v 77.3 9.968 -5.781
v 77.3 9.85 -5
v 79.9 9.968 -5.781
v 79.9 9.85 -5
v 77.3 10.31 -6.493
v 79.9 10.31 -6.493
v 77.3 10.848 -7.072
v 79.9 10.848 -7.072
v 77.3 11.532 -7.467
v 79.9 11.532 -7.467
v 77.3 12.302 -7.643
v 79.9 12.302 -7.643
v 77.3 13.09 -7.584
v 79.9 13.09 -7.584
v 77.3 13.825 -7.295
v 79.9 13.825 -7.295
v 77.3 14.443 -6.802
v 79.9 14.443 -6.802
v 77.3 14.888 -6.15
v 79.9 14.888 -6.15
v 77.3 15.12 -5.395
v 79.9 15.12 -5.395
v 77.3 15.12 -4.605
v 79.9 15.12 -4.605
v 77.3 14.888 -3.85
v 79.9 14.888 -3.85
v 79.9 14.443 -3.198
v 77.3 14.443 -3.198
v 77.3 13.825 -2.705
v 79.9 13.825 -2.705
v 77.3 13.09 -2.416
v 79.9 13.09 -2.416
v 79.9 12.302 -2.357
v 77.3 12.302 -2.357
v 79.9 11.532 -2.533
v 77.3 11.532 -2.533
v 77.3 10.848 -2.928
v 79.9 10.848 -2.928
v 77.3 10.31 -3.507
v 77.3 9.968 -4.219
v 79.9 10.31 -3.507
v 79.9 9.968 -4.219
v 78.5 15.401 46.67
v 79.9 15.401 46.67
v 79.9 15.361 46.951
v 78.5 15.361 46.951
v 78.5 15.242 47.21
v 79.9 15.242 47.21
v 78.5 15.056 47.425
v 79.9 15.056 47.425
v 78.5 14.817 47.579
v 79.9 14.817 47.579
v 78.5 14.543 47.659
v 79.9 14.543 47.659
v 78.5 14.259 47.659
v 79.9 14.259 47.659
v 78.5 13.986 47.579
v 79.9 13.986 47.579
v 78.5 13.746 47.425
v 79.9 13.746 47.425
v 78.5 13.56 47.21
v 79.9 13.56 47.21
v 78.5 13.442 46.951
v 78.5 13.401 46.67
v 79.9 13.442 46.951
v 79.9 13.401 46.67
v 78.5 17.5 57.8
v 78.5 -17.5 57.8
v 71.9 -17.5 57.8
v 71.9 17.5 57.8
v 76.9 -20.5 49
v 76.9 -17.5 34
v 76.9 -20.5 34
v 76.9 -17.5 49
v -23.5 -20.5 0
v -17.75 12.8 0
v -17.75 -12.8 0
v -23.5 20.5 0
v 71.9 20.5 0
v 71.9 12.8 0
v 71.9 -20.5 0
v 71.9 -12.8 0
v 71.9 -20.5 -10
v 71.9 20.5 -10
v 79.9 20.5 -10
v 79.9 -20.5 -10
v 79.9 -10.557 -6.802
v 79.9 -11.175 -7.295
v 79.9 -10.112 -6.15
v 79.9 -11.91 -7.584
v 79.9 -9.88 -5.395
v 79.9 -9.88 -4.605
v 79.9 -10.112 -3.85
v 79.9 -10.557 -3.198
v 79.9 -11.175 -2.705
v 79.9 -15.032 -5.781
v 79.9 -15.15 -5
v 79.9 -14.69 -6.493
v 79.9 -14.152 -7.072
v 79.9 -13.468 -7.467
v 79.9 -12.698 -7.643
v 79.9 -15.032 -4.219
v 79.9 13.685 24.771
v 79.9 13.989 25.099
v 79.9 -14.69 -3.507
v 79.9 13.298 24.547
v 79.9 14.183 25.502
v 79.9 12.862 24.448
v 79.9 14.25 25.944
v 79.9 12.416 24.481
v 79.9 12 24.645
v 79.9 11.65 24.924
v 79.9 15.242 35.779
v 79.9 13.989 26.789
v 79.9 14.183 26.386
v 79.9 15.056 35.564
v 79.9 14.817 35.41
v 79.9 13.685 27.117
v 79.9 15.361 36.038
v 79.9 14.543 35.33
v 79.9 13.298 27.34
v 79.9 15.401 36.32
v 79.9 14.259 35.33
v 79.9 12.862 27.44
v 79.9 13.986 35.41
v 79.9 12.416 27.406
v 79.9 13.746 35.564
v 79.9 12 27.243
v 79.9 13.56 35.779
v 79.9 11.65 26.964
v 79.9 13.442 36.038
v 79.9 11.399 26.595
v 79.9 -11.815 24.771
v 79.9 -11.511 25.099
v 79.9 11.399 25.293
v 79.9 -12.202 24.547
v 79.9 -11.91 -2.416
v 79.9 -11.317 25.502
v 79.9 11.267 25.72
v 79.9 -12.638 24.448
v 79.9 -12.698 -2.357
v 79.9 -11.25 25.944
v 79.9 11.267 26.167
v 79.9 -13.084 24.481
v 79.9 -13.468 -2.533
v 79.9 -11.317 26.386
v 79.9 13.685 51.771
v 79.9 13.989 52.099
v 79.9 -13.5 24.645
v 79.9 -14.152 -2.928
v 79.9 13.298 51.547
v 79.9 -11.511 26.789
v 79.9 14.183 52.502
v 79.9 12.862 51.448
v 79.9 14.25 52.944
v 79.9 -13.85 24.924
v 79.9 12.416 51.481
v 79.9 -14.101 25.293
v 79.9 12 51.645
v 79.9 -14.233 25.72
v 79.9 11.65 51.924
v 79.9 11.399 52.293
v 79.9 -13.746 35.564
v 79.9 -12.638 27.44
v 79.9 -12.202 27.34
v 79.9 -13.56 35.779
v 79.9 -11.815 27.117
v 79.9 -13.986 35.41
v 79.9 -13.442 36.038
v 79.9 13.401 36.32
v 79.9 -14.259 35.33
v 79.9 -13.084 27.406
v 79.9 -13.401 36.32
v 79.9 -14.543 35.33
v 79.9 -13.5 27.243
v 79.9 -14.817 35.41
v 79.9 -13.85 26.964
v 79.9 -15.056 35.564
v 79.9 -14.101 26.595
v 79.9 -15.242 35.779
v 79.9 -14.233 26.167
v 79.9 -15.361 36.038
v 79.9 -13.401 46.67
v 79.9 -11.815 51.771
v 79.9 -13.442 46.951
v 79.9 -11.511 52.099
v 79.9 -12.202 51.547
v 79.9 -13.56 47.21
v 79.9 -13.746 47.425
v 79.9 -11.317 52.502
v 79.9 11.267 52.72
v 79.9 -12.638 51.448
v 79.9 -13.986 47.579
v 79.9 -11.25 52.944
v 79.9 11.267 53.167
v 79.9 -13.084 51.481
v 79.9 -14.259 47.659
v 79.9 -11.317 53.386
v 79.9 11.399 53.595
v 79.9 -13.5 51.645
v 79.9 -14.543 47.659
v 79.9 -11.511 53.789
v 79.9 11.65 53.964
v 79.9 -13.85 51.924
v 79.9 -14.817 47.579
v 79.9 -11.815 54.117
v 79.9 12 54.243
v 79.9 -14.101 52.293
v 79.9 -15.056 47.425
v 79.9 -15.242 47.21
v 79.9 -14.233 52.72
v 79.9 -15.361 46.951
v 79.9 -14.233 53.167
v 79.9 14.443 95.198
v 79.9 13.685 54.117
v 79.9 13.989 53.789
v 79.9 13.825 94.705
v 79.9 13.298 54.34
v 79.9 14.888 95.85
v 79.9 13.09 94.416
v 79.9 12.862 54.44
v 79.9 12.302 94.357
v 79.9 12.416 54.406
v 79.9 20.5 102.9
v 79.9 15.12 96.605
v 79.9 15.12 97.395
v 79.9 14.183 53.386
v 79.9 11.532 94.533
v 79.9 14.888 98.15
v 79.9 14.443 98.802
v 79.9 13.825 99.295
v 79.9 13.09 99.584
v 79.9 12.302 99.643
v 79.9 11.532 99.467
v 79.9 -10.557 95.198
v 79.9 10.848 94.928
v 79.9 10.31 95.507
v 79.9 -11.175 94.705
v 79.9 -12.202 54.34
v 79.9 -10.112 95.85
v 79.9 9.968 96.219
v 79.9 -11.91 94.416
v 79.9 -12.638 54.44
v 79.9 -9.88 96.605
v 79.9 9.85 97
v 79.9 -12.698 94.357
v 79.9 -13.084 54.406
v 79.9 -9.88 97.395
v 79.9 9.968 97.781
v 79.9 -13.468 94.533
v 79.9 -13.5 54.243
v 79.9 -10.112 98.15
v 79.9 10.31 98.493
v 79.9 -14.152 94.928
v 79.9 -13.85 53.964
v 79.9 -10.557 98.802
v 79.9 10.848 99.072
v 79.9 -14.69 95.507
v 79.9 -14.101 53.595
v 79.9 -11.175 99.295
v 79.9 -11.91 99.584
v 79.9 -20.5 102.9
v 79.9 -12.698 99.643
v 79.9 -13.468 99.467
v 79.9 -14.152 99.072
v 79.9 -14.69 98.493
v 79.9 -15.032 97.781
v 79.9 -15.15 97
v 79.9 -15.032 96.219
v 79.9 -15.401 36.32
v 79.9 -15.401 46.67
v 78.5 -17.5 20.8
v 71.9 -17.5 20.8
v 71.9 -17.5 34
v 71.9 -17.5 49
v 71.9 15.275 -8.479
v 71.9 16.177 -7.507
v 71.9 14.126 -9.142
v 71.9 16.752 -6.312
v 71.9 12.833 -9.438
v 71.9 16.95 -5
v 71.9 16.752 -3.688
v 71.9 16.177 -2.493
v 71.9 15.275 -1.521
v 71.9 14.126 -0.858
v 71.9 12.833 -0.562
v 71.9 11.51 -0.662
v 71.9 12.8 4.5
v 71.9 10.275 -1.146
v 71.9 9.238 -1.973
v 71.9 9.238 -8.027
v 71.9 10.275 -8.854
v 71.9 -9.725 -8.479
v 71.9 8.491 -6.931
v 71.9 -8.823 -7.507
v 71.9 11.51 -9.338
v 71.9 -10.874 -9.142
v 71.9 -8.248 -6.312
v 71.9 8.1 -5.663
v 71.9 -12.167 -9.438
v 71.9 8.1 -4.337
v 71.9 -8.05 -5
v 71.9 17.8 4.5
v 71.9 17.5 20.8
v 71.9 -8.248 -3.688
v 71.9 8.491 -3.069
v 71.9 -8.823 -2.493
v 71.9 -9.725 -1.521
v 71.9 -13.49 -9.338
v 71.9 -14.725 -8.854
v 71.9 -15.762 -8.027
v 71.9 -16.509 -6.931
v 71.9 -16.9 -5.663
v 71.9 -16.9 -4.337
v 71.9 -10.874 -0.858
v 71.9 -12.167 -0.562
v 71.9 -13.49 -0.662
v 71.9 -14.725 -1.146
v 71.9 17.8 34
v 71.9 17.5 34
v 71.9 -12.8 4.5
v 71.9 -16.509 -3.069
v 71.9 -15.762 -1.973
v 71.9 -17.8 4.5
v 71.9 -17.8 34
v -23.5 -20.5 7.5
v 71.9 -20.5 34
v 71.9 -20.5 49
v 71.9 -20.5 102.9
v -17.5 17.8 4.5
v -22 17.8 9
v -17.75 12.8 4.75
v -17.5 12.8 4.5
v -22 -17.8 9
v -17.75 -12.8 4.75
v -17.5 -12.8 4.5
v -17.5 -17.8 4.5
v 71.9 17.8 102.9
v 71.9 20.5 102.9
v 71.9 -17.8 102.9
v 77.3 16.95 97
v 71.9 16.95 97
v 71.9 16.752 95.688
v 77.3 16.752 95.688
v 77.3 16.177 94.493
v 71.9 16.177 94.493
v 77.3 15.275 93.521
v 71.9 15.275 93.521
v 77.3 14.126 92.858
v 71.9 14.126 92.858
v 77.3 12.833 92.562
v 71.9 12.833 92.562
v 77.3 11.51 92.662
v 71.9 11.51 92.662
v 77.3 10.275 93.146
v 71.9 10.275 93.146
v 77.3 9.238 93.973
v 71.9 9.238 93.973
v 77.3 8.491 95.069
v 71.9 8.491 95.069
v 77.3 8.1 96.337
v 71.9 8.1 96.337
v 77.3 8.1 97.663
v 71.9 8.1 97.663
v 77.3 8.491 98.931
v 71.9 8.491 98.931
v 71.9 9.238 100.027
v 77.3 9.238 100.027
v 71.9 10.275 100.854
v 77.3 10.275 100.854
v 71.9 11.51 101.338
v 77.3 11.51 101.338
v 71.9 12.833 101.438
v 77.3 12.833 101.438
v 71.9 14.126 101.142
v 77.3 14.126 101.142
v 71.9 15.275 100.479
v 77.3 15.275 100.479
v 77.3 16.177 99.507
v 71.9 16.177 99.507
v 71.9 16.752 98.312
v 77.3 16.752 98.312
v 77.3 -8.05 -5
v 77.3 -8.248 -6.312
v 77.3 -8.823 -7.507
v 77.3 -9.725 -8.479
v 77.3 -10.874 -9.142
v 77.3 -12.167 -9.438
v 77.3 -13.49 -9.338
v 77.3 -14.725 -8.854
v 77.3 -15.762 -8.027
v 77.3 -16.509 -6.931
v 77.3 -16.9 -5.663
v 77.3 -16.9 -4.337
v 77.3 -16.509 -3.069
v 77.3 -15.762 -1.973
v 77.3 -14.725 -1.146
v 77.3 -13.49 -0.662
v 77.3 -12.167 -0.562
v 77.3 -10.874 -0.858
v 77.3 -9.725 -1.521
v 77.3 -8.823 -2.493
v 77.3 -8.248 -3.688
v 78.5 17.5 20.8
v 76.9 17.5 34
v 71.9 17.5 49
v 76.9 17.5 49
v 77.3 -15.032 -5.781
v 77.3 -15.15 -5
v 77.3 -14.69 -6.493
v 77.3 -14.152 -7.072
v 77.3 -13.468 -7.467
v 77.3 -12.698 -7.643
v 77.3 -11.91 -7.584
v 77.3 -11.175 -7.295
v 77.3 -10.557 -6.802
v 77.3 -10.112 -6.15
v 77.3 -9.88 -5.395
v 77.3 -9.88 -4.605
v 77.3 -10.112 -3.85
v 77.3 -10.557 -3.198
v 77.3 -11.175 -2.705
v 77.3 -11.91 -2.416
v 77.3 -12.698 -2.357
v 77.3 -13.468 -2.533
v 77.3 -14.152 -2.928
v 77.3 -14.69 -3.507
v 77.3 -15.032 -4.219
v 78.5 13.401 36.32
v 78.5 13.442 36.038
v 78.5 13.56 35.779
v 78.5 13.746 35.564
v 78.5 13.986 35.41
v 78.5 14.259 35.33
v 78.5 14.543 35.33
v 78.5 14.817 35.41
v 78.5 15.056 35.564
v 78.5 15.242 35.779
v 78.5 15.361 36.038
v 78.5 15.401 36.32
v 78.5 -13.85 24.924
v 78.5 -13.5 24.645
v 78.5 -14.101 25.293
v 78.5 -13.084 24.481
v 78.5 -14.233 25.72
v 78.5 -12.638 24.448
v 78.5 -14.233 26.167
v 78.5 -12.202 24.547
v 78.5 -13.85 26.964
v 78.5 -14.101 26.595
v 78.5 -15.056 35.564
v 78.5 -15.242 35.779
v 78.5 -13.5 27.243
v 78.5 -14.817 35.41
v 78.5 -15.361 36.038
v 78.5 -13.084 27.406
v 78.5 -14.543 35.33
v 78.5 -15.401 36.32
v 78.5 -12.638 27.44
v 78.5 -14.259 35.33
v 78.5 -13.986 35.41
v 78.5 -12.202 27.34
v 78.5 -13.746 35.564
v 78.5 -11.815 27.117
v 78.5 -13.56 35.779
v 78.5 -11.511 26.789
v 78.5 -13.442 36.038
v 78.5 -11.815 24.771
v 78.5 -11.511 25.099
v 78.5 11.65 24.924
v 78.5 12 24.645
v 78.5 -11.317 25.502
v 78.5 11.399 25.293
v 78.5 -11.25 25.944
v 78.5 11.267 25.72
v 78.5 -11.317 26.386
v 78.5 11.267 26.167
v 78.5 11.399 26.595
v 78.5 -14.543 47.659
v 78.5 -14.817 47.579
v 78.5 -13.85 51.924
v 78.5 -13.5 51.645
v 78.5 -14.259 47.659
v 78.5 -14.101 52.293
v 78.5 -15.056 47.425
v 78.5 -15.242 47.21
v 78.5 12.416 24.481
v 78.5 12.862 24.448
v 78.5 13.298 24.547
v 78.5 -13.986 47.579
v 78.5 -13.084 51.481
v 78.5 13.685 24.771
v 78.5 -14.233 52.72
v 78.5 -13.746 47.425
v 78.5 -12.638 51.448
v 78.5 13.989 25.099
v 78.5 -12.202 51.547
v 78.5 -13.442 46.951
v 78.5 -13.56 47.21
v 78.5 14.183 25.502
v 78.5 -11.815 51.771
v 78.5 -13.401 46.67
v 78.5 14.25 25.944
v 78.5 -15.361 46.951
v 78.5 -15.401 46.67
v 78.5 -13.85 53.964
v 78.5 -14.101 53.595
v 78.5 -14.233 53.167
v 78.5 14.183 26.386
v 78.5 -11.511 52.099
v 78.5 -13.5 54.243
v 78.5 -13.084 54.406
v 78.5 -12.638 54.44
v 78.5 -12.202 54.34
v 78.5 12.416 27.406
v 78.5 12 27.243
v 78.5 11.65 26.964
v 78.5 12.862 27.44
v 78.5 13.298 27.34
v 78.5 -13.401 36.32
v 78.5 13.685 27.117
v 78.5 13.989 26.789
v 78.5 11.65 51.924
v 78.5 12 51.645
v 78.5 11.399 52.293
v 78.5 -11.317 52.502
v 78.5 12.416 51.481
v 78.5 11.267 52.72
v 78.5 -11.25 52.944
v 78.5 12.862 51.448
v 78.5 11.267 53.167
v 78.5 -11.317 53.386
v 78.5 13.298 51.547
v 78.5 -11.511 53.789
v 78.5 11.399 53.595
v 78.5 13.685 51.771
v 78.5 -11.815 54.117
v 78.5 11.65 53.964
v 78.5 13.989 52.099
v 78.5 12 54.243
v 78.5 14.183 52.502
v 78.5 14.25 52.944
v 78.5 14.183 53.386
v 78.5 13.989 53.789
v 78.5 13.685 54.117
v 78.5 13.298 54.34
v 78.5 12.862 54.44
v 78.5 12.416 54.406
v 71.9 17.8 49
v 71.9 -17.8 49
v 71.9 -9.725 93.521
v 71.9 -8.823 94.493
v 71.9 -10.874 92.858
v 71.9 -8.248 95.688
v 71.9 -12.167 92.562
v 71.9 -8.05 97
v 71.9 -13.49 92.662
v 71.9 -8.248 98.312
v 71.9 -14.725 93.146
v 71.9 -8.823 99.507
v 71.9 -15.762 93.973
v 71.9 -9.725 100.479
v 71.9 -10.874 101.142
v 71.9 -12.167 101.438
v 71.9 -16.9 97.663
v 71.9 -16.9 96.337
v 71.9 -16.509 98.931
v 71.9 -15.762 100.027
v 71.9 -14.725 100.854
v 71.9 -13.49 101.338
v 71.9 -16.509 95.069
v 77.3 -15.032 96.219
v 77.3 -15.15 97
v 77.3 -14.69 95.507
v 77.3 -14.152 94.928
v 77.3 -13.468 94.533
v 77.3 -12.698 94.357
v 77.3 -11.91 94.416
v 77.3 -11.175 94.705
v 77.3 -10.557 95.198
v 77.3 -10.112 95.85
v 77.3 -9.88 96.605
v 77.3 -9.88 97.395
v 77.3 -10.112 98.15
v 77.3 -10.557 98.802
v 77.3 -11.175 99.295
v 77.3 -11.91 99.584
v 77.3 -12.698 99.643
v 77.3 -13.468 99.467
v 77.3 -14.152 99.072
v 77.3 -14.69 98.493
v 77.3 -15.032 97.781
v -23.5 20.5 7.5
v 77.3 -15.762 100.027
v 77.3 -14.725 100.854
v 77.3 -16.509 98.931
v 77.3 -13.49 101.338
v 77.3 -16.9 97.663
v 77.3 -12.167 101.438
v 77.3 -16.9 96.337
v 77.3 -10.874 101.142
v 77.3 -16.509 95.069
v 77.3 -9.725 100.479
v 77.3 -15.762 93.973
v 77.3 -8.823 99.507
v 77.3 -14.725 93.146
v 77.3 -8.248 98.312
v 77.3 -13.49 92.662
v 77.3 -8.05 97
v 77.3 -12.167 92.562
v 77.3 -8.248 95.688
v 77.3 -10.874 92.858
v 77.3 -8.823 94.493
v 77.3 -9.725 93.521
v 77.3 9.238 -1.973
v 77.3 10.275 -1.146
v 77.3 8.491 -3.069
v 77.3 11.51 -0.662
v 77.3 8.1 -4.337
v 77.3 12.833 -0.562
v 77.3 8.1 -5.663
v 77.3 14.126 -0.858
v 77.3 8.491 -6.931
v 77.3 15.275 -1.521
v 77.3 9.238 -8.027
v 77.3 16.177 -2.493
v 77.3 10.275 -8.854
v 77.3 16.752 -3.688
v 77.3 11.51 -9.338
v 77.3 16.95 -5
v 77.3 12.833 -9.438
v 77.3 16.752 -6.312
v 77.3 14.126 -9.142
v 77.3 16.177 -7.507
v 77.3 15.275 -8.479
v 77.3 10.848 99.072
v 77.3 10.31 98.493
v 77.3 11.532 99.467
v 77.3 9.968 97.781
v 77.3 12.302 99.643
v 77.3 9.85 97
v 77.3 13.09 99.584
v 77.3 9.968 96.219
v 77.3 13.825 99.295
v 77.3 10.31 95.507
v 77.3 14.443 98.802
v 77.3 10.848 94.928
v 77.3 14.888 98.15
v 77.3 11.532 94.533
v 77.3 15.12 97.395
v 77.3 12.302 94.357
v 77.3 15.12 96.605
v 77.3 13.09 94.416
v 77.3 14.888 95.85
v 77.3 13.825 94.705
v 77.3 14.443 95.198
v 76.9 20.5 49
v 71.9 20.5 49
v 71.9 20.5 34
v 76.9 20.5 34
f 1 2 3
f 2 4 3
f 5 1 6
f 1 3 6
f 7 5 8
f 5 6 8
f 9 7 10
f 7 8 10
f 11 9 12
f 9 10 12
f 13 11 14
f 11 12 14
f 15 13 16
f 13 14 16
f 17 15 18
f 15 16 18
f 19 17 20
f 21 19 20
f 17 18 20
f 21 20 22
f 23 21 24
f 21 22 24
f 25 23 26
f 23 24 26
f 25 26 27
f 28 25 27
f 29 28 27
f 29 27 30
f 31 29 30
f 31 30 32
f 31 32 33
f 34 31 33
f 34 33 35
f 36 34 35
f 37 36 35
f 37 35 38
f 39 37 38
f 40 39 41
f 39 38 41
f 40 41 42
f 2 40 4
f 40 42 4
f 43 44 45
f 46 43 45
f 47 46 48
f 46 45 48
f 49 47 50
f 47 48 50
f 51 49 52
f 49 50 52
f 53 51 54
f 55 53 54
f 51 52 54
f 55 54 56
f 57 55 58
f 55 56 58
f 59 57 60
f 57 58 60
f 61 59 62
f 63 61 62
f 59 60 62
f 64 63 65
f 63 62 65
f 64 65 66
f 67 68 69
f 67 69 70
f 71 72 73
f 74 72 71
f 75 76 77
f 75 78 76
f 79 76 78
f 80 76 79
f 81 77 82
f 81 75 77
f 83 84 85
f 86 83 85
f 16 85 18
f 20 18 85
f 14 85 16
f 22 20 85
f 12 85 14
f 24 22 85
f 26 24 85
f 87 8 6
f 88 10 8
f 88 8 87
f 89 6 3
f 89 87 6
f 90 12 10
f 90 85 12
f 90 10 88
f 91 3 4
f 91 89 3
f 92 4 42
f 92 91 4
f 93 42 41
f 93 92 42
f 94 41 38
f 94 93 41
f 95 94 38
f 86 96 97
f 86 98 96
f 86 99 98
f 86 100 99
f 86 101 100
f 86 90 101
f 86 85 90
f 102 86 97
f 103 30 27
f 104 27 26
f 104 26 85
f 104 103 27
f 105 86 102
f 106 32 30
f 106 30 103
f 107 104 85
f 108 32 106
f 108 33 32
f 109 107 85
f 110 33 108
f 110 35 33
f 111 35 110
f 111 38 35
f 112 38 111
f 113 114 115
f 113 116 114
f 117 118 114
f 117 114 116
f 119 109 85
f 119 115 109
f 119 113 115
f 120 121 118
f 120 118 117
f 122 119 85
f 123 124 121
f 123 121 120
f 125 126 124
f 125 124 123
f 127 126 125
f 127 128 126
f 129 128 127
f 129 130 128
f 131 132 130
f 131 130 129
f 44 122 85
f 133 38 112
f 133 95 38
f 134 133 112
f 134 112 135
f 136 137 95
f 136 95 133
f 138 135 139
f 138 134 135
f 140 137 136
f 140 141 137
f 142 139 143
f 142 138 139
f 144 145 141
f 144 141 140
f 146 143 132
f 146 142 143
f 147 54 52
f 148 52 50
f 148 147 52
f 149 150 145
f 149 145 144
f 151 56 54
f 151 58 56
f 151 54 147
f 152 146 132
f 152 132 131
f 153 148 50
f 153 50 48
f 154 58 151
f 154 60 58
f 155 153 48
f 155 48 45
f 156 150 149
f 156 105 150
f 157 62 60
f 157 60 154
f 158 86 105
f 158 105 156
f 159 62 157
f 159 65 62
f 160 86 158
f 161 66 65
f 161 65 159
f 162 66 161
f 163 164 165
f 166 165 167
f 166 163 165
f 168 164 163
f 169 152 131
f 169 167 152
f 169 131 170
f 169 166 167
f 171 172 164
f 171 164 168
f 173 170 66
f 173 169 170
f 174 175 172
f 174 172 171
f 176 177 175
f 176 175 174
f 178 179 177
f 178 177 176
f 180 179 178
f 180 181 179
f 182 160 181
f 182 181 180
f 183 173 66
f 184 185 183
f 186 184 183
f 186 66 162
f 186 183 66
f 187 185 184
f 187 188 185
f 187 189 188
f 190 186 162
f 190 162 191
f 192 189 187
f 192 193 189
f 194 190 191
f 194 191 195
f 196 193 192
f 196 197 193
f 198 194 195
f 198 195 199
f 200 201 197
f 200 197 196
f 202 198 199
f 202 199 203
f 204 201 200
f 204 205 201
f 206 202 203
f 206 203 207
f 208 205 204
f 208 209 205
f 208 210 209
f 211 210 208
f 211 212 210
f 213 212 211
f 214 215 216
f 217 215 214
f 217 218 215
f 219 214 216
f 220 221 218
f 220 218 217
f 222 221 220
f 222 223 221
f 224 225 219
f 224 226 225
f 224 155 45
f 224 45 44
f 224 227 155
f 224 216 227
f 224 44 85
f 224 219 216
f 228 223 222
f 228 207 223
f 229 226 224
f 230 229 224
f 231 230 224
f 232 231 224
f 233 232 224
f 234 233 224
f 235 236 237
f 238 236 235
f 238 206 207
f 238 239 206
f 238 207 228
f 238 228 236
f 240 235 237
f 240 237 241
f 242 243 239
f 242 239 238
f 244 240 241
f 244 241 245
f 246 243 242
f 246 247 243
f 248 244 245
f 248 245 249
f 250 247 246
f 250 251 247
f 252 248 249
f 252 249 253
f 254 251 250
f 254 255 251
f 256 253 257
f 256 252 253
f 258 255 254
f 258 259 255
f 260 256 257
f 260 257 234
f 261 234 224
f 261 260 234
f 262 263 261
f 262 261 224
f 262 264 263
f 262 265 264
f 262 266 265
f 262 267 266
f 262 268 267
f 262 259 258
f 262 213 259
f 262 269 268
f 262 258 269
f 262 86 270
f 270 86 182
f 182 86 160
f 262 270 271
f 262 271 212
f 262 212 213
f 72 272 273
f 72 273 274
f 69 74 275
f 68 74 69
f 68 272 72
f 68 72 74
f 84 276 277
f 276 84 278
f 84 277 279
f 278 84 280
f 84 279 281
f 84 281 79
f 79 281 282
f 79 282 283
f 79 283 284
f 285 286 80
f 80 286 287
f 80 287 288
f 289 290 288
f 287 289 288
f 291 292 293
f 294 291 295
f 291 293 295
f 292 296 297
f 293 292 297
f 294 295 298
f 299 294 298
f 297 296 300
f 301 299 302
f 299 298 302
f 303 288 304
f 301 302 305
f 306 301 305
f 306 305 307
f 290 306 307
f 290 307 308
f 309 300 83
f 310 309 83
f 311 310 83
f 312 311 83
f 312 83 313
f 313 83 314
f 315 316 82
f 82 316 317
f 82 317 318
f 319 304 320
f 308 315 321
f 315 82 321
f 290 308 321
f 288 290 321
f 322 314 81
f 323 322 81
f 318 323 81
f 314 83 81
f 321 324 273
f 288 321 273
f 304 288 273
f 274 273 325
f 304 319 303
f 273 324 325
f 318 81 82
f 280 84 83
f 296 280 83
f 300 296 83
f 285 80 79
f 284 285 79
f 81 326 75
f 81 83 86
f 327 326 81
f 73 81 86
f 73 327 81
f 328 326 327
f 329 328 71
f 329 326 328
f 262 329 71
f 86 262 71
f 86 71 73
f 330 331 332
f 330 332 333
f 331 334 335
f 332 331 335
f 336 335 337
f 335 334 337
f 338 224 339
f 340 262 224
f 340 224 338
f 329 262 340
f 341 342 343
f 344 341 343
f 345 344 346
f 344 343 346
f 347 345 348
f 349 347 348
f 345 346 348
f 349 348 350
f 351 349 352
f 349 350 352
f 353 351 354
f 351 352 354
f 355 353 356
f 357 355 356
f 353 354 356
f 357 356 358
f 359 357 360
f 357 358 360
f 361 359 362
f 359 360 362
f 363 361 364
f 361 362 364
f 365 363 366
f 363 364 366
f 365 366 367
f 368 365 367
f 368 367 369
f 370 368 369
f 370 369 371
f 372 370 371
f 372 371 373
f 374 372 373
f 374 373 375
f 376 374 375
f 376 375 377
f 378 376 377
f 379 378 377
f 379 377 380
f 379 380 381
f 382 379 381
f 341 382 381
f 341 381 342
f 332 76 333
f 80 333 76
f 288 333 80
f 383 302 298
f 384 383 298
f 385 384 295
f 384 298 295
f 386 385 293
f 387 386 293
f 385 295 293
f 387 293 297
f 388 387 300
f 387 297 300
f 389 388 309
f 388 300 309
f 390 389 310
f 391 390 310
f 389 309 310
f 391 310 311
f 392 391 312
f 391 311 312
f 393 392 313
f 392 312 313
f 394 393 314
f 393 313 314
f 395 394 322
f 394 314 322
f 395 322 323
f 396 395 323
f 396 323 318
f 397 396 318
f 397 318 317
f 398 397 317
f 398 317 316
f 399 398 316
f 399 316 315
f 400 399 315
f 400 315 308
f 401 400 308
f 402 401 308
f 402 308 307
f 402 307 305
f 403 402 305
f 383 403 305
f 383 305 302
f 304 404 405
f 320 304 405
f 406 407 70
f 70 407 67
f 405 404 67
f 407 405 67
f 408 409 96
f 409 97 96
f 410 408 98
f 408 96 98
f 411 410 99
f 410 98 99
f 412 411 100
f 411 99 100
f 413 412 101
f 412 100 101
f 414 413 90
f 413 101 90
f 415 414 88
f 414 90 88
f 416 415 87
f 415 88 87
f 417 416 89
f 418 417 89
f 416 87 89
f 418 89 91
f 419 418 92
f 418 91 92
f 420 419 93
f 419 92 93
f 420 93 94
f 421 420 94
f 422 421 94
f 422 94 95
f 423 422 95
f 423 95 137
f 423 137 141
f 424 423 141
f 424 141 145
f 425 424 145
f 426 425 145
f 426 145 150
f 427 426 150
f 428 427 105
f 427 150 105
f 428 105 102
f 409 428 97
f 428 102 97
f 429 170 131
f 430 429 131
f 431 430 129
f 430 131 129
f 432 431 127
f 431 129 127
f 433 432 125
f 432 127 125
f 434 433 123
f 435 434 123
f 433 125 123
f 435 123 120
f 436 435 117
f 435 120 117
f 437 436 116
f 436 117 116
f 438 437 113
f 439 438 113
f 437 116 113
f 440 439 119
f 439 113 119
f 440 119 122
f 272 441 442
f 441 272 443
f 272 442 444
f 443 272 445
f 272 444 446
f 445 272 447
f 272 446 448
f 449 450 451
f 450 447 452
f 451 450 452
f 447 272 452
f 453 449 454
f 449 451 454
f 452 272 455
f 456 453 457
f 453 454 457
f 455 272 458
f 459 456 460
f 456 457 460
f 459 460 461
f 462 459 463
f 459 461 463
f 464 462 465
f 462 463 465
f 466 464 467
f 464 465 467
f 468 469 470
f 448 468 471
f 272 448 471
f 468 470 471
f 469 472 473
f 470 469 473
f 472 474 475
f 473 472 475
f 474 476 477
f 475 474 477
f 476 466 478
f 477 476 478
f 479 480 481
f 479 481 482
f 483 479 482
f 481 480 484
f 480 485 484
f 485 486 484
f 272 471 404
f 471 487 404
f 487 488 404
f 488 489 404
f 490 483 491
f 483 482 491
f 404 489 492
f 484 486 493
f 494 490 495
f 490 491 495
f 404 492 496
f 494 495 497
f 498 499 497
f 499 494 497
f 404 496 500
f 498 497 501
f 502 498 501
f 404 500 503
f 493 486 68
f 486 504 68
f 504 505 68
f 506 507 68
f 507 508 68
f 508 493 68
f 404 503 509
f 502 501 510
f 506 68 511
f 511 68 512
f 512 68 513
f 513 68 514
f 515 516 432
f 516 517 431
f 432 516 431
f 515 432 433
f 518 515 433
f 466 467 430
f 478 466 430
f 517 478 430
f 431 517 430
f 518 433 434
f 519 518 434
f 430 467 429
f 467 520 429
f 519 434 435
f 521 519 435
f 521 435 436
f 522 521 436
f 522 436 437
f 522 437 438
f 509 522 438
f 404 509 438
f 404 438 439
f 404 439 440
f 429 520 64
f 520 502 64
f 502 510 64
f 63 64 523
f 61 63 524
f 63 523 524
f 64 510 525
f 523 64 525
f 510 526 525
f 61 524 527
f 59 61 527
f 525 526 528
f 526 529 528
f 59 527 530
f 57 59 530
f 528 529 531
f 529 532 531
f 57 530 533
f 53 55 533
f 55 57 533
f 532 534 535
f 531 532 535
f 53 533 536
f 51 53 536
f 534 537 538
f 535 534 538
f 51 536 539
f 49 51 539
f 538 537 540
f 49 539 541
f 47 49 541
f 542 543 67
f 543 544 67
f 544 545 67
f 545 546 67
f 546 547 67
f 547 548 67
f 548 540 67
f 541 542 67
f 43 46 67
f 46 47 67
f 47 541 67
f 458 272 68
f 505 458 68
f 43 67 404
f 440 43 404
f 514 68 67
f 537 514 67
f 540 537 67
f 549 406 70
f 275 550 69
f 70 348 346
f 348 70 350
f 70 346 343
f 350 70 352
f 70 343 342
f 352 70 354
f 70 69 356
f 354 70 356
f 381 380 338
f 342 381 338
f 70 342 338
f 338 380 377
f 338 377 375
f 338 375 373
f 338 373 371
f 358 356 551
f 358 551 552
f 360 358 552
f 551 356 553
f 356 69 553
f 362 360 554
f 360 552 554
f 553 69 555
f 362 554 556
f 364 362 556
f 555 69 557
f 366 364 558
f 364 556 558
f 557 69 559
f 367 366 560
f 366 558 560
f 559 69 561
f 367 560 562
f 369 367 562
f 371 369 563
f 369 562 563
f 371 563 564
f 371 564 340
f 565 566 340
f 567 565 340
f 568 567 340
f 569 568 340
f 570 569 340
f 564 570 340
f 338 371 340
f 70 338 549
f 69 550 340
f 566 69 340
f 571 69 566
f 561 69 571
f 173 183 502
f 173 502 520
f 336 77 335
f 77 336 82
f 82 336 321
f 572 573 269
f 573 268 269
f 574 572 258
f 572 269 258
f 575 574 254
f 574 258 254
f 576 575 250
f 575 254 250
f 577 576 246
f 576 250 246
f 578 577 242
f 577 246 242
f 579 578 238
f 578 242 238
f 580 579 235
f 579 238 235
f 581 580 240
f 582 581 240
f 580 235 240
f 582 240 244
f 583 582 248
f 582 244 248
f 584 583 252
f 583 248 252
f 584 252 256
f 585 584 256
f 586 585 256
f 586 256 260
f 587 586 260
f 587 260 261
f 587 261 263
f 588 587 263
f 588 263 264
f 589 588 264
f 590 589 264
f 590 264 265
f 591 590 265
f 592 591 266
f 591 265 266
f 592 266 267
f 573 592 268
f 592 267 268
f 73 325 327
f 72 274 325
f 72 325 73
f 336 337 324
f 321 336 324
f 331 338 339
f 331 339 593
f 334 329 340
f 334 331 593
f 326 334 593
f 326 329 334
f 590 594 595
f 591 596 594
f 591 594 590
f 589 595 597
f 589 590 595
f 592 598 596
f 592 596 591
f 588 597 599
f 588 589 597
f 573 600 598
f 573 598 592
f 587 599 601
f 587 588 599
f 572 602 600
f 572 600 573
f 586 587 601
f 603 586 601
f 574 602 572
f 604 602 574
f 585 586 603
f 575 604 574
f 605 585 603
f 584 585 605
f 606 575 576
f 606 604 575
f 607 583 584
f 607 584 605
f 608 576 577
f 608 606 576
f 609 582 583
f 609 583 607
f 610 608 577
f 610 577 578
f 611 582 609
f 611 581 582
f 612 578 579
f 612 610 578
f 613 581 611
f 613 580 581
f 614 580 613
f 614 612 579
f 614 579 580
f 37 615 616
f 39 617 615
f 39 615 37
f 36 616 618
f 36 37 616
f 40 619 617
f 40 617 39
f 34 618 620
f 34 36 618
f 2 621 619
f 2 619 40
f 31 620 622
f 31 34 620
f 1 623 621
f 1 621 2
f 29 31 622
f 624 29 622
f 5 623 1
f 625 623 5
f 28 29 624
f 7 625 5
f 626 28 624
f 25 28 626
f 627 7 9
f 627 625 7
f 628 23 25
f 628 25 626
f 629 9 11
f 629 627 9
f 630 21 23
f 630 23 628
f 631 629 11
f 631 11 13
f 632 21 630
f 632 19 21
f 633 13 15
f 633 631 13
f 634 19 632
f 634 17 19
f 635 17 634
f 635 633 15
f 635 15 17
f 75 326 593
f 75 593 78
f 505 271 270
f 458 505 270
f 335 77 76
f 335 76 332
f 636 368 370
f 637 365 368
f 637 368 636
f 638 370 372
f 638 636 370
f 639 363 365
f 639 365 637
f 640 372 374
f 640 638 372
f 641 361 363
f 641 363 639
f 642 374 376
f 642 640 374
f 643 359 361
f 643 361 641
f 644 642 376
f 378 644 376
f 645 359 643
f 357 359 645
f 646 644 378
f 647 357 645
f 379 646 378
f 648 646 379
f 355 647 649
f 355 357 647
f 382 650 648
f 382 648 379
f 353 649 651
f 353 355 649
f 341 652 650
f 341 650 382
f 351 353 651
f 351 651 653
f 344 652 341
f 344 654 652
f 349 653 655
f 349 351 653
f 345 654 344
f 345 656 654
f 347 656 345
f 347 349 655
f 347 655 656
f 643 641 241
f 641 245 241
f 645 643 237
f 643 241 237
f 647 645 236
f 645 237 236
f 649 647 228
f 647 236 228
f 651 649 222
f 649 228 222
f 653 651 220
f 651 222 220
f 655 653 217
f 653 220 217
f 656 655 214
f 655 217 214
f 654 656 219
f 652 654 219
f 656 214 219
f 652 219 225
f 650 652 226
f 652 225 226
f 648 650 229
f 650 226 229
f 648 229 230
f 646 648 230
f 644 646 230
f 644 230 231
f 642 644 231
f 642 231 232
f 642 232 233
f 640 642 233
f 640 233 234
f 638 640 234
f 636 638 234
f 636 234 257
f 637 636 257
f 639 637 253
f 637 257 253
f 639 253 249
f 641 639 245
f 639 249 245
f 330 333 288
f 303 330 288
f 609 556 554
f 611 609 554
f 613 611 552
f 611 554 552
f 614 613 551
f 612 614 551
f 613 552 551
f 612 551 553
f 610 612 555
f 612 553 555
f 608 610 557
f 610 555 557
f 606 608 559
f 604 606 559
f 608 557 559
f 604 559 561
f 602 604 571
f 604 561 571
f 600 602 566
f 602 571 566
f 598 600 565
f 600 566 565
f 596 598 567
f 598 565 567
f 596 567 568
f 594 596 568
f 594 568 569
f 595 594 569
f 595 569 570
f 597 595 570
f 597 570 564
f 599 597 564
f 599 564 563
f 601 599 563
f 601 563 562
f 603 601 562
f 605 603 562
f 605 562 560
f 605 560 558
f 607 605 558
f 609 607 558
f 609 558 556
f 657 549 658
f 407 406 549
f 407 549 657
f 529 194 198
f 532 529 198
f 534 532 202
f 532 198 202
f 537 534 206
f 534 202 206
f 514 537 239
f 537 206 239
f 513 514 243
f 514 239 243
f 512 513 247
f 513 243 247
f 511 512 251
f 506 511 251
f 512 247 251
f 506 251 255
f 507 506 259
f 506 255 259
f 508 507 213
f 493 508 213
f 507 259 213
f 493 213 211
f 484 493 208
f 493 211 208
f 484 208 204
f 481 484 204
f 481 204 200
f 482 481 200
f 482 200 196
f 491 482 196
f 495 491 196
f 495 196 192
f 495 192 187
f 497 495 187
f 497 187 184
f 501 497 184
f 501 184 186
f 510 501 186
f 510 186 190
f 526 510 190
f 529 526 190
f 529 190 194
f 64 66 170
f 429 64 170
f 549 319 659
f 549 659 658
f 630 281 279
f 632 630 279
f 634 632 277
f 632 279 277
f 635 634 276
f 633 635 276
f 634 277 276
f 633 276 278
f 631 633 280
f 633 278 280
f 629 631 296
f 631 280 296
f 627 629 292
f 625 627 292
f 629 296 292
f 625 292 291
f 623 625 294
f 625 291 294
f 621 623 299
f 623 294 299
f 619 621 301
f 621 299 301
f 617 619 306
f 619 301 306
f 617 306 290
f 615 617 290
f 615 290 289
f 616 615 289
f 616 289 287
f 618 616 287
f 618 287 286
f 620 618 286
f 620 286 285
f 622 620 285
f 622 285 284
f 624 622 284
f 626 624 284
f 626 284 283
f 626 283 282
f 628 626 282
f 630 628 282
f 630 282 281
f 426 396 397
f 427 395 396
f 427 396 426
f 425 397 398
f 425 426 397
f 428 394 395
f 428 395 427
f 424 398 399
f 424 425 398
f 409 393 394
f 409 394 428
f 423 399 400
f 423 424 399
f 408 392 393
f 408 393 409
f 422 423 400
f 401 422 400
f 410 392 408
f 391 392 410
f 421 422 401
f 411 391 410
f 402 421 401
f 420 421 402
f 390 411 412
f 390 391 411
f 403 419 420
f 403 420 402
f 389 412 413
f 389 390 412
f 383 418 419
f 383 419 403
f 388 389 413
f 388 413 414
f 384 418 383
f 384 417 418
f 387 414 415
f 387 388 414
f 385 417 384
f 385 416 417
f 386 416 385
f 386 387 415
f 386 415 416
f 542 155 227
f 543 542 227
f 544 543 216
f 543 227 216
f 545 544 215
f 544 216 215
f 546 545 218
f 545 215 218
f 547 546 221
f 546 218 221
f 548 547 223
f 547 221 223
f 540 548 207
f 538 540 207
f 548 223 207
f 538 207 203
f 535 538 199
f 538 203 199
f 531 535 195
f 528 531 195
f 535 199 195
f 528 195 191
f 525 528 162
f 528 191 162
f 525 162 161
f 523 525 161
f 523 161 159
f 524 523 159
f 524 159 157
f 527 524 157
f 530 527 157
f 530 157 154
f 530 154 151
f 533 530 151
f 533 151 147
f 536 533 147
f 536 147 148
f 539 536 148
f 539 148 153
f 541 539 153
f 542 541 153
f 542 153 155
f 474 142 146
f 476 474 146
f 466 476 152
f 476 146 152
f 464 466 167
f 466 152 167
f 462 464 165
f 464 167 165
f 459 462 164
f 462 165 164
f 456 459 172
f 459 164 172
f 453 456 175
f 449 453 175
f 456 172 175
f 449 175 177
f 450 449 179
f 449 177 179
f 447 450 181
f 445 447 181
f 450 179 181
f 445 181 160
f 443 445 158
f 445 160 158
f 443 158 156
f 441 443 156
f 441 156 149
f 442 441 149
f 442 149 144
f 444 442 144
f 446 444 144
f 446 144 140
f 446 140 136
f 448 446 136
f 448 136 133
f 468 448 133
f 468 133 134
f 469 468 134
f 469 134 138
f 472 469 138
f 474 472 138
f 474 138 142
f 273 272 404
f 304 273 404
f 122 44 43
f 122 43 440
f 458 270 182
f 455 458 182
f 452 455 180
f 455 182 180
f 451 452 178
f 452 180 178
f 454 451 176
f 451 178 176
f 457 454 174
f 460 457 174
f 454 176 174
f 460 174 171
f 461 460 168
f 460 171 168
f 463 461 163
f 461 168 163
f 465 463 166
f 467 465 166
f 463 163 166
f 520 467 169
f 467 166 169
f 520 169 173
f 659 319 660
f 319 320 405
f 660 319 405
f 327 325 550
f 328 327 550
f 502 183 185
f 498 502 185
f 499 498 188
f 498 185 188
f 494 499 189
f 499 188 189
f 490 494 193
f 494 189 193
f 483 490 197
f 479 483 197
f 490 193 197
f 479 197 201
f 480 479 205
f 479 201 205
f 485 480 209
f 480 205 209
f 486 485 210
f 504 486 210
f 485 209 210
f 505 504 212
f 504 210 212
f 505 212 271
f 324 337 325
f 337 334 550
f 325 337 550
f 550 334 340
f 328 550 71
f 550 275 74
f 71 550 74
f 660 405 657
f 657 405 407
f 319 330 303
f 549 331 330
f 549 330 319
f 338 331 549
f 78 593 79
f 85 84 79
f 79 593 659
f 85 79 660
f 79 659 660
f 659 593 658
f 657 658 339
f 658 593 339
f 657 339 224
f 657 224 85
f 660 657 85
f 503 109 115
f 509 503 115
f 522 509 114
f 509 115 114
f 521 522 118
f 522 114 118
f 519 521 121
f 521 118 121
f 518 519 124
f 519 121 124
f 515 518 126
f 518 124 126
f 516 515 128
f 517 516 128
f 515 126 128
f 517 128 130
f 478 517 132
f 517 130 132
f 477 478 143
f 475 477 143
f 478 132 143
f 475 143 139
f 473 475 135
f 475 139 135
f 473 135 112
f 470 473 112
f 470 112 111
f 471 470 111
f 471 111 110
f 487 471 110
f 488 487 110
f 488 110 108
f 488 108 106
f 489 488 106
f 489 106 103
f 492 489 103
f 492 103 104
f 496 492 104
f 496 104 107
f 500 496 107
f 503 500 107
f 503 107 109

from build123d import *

# Parameters (mm, degrees)
PAD001_DEPTH         = 20.5
POCKET_DEPTH         = 17.8
SKETCH020_W          = 89.65
SKETCH020_H          = 5
POCKET002_DEPTH      = 12.8
HOLE006_D            = 5.3
HOLE006_CBORE_D      = 8.9
HOLE006_CBORE_DEPTH  = 5.4
SKETCH032_W          = 35
SKETCH032_H          = 37
POCKET010_DEPTH      = 102.001
SKETCH033_W          = 5
SKETCH033_H          = 15
POCKET011_DEPTH      = 20.501
POCKET011_DEPTH_BACK = 20.501
SKETCH034_R          = 1.5
POCKET012_DEPTH      = 103.501


with BuildPart() as part:
    # Sketch018 → Pad001 (new body, symmetric)
    with BuildSketch(Plane.XZ):
        Polygon((71.9, 102.9), (-23.5, 7.5), (-23.5, 0), (71.9, 0), (71.9, -10), (79.9, -10), (79.9, 102.9), align=None)
    extrude(amount=PAD001_DEPTH, both=True)

    # Sketch019 → Pocket (cut, symmetric)
    with BuildSketch(Plane.XZ):
        Polygon((-17.5, 4.5), (71.9, 4.5), (71.9, 104.5), (-27.5, 104.5), (-27.5, 14.5), align=None)
    extrude(amount=POCKET_DEPTH, both=True, mode=Mode.SUBTRACT)

    # Sketch020 → Pocket002 (cut, symmetric)
    with BuildSketch(Plane.XZ):
        with Locations((27.075, 2.5)):
            Rectangle(SKETCH020_W, SKETCH020_H)
    extrude(amount=POCKET002_DEPTH, both=True, mode=Mode.SUBTRACT)

    # Hole006 (through all)
    with Locations(Plane(origin=(71.9, 0, 0), x_dir=(0, 1, 0), z_dir=(-1, 0, 0))):
        with Locations((-12.5, -97), (12.5, -97), (-12.5, 5), (12.5, 5)):
            CounterBoreHole(HOLE006_D / 2, HOLE006_CBORE_D / 2, HOLE006_CBORE_DEPTH)

    # Sketch032 → Pocket010 (cut, through all)
    with BuildSketch(Plane.YZ.offset(78.5)):
        with Locations((0, 39.3)):
            Rectangle(SKETCH032_W, SKETCH032_H)
    extrude(amount=-POCKET010_DEPTH, mode=Mode.SUBTRACT)

    # Sketch033 → Pocket011 (cut, two sides)
    with BuildSketch(Plane.XZ) as pocket011_sk:
        with Locations((74.4, 41.5)):
            Rectangle(SKETCH033_W, SKETCH033_H)
    extrude(amount=-POCKET011_DEPTH, mode=Mode.SUBTRACT)
    extrude(pocket011_sk.sketch, amount=POCKET011_DEPTH_BACK, mode=Mode.SUBTRACT)

    # Sketch034 → Pocket012 (cut, through all)
    with BuildSketch(Plane.YZ.offset(80)):
        with Locations((-12.75, 52.94381)):
            Circle(SKETCH034_R)
        with Locations((12.75, 52.94381)):
            Circle(SKETCH034_R)
        with Locations((12.75, 25.94381)):
            Circle(SKETCH034_R)
        with Locations((-12.75, 25.94381)):
            Circle(SKETCH034_R)
        with BuildLine():
            ThreePointArc((-13.401099, 46.669643), (-14.401099, 47.669643), (-15.401099, 46.669643))
            Line((-15.401099, 46.669643), (-15.401099, 36.32))
            ThreePointArc((-15.401099, 36.32), (-14.401099, 35.32), (-13.401099, 36.32))
            Line((-13.401099, 46.669643), (-13.401099, 36.32))
        make_face()
        with BuildLine():
            ThreePointArc((15.401099, 46.669643), (14.401099, 47.669643), (13.401099, 46.669643))
            Line((13.401099, 46.669643), (13.401099, 36.32))
            ThreePointArc((13.401099, 36.32), (14.401099, 35.32), (15.401099, 36.32))
            Line((15.401099, 46.669643), (15.401099, 36.32))
        make_face()
    extrude(amount=-POCKET012_DEPTH, mode=Mode.SUBTRACT)


solid = part.part
